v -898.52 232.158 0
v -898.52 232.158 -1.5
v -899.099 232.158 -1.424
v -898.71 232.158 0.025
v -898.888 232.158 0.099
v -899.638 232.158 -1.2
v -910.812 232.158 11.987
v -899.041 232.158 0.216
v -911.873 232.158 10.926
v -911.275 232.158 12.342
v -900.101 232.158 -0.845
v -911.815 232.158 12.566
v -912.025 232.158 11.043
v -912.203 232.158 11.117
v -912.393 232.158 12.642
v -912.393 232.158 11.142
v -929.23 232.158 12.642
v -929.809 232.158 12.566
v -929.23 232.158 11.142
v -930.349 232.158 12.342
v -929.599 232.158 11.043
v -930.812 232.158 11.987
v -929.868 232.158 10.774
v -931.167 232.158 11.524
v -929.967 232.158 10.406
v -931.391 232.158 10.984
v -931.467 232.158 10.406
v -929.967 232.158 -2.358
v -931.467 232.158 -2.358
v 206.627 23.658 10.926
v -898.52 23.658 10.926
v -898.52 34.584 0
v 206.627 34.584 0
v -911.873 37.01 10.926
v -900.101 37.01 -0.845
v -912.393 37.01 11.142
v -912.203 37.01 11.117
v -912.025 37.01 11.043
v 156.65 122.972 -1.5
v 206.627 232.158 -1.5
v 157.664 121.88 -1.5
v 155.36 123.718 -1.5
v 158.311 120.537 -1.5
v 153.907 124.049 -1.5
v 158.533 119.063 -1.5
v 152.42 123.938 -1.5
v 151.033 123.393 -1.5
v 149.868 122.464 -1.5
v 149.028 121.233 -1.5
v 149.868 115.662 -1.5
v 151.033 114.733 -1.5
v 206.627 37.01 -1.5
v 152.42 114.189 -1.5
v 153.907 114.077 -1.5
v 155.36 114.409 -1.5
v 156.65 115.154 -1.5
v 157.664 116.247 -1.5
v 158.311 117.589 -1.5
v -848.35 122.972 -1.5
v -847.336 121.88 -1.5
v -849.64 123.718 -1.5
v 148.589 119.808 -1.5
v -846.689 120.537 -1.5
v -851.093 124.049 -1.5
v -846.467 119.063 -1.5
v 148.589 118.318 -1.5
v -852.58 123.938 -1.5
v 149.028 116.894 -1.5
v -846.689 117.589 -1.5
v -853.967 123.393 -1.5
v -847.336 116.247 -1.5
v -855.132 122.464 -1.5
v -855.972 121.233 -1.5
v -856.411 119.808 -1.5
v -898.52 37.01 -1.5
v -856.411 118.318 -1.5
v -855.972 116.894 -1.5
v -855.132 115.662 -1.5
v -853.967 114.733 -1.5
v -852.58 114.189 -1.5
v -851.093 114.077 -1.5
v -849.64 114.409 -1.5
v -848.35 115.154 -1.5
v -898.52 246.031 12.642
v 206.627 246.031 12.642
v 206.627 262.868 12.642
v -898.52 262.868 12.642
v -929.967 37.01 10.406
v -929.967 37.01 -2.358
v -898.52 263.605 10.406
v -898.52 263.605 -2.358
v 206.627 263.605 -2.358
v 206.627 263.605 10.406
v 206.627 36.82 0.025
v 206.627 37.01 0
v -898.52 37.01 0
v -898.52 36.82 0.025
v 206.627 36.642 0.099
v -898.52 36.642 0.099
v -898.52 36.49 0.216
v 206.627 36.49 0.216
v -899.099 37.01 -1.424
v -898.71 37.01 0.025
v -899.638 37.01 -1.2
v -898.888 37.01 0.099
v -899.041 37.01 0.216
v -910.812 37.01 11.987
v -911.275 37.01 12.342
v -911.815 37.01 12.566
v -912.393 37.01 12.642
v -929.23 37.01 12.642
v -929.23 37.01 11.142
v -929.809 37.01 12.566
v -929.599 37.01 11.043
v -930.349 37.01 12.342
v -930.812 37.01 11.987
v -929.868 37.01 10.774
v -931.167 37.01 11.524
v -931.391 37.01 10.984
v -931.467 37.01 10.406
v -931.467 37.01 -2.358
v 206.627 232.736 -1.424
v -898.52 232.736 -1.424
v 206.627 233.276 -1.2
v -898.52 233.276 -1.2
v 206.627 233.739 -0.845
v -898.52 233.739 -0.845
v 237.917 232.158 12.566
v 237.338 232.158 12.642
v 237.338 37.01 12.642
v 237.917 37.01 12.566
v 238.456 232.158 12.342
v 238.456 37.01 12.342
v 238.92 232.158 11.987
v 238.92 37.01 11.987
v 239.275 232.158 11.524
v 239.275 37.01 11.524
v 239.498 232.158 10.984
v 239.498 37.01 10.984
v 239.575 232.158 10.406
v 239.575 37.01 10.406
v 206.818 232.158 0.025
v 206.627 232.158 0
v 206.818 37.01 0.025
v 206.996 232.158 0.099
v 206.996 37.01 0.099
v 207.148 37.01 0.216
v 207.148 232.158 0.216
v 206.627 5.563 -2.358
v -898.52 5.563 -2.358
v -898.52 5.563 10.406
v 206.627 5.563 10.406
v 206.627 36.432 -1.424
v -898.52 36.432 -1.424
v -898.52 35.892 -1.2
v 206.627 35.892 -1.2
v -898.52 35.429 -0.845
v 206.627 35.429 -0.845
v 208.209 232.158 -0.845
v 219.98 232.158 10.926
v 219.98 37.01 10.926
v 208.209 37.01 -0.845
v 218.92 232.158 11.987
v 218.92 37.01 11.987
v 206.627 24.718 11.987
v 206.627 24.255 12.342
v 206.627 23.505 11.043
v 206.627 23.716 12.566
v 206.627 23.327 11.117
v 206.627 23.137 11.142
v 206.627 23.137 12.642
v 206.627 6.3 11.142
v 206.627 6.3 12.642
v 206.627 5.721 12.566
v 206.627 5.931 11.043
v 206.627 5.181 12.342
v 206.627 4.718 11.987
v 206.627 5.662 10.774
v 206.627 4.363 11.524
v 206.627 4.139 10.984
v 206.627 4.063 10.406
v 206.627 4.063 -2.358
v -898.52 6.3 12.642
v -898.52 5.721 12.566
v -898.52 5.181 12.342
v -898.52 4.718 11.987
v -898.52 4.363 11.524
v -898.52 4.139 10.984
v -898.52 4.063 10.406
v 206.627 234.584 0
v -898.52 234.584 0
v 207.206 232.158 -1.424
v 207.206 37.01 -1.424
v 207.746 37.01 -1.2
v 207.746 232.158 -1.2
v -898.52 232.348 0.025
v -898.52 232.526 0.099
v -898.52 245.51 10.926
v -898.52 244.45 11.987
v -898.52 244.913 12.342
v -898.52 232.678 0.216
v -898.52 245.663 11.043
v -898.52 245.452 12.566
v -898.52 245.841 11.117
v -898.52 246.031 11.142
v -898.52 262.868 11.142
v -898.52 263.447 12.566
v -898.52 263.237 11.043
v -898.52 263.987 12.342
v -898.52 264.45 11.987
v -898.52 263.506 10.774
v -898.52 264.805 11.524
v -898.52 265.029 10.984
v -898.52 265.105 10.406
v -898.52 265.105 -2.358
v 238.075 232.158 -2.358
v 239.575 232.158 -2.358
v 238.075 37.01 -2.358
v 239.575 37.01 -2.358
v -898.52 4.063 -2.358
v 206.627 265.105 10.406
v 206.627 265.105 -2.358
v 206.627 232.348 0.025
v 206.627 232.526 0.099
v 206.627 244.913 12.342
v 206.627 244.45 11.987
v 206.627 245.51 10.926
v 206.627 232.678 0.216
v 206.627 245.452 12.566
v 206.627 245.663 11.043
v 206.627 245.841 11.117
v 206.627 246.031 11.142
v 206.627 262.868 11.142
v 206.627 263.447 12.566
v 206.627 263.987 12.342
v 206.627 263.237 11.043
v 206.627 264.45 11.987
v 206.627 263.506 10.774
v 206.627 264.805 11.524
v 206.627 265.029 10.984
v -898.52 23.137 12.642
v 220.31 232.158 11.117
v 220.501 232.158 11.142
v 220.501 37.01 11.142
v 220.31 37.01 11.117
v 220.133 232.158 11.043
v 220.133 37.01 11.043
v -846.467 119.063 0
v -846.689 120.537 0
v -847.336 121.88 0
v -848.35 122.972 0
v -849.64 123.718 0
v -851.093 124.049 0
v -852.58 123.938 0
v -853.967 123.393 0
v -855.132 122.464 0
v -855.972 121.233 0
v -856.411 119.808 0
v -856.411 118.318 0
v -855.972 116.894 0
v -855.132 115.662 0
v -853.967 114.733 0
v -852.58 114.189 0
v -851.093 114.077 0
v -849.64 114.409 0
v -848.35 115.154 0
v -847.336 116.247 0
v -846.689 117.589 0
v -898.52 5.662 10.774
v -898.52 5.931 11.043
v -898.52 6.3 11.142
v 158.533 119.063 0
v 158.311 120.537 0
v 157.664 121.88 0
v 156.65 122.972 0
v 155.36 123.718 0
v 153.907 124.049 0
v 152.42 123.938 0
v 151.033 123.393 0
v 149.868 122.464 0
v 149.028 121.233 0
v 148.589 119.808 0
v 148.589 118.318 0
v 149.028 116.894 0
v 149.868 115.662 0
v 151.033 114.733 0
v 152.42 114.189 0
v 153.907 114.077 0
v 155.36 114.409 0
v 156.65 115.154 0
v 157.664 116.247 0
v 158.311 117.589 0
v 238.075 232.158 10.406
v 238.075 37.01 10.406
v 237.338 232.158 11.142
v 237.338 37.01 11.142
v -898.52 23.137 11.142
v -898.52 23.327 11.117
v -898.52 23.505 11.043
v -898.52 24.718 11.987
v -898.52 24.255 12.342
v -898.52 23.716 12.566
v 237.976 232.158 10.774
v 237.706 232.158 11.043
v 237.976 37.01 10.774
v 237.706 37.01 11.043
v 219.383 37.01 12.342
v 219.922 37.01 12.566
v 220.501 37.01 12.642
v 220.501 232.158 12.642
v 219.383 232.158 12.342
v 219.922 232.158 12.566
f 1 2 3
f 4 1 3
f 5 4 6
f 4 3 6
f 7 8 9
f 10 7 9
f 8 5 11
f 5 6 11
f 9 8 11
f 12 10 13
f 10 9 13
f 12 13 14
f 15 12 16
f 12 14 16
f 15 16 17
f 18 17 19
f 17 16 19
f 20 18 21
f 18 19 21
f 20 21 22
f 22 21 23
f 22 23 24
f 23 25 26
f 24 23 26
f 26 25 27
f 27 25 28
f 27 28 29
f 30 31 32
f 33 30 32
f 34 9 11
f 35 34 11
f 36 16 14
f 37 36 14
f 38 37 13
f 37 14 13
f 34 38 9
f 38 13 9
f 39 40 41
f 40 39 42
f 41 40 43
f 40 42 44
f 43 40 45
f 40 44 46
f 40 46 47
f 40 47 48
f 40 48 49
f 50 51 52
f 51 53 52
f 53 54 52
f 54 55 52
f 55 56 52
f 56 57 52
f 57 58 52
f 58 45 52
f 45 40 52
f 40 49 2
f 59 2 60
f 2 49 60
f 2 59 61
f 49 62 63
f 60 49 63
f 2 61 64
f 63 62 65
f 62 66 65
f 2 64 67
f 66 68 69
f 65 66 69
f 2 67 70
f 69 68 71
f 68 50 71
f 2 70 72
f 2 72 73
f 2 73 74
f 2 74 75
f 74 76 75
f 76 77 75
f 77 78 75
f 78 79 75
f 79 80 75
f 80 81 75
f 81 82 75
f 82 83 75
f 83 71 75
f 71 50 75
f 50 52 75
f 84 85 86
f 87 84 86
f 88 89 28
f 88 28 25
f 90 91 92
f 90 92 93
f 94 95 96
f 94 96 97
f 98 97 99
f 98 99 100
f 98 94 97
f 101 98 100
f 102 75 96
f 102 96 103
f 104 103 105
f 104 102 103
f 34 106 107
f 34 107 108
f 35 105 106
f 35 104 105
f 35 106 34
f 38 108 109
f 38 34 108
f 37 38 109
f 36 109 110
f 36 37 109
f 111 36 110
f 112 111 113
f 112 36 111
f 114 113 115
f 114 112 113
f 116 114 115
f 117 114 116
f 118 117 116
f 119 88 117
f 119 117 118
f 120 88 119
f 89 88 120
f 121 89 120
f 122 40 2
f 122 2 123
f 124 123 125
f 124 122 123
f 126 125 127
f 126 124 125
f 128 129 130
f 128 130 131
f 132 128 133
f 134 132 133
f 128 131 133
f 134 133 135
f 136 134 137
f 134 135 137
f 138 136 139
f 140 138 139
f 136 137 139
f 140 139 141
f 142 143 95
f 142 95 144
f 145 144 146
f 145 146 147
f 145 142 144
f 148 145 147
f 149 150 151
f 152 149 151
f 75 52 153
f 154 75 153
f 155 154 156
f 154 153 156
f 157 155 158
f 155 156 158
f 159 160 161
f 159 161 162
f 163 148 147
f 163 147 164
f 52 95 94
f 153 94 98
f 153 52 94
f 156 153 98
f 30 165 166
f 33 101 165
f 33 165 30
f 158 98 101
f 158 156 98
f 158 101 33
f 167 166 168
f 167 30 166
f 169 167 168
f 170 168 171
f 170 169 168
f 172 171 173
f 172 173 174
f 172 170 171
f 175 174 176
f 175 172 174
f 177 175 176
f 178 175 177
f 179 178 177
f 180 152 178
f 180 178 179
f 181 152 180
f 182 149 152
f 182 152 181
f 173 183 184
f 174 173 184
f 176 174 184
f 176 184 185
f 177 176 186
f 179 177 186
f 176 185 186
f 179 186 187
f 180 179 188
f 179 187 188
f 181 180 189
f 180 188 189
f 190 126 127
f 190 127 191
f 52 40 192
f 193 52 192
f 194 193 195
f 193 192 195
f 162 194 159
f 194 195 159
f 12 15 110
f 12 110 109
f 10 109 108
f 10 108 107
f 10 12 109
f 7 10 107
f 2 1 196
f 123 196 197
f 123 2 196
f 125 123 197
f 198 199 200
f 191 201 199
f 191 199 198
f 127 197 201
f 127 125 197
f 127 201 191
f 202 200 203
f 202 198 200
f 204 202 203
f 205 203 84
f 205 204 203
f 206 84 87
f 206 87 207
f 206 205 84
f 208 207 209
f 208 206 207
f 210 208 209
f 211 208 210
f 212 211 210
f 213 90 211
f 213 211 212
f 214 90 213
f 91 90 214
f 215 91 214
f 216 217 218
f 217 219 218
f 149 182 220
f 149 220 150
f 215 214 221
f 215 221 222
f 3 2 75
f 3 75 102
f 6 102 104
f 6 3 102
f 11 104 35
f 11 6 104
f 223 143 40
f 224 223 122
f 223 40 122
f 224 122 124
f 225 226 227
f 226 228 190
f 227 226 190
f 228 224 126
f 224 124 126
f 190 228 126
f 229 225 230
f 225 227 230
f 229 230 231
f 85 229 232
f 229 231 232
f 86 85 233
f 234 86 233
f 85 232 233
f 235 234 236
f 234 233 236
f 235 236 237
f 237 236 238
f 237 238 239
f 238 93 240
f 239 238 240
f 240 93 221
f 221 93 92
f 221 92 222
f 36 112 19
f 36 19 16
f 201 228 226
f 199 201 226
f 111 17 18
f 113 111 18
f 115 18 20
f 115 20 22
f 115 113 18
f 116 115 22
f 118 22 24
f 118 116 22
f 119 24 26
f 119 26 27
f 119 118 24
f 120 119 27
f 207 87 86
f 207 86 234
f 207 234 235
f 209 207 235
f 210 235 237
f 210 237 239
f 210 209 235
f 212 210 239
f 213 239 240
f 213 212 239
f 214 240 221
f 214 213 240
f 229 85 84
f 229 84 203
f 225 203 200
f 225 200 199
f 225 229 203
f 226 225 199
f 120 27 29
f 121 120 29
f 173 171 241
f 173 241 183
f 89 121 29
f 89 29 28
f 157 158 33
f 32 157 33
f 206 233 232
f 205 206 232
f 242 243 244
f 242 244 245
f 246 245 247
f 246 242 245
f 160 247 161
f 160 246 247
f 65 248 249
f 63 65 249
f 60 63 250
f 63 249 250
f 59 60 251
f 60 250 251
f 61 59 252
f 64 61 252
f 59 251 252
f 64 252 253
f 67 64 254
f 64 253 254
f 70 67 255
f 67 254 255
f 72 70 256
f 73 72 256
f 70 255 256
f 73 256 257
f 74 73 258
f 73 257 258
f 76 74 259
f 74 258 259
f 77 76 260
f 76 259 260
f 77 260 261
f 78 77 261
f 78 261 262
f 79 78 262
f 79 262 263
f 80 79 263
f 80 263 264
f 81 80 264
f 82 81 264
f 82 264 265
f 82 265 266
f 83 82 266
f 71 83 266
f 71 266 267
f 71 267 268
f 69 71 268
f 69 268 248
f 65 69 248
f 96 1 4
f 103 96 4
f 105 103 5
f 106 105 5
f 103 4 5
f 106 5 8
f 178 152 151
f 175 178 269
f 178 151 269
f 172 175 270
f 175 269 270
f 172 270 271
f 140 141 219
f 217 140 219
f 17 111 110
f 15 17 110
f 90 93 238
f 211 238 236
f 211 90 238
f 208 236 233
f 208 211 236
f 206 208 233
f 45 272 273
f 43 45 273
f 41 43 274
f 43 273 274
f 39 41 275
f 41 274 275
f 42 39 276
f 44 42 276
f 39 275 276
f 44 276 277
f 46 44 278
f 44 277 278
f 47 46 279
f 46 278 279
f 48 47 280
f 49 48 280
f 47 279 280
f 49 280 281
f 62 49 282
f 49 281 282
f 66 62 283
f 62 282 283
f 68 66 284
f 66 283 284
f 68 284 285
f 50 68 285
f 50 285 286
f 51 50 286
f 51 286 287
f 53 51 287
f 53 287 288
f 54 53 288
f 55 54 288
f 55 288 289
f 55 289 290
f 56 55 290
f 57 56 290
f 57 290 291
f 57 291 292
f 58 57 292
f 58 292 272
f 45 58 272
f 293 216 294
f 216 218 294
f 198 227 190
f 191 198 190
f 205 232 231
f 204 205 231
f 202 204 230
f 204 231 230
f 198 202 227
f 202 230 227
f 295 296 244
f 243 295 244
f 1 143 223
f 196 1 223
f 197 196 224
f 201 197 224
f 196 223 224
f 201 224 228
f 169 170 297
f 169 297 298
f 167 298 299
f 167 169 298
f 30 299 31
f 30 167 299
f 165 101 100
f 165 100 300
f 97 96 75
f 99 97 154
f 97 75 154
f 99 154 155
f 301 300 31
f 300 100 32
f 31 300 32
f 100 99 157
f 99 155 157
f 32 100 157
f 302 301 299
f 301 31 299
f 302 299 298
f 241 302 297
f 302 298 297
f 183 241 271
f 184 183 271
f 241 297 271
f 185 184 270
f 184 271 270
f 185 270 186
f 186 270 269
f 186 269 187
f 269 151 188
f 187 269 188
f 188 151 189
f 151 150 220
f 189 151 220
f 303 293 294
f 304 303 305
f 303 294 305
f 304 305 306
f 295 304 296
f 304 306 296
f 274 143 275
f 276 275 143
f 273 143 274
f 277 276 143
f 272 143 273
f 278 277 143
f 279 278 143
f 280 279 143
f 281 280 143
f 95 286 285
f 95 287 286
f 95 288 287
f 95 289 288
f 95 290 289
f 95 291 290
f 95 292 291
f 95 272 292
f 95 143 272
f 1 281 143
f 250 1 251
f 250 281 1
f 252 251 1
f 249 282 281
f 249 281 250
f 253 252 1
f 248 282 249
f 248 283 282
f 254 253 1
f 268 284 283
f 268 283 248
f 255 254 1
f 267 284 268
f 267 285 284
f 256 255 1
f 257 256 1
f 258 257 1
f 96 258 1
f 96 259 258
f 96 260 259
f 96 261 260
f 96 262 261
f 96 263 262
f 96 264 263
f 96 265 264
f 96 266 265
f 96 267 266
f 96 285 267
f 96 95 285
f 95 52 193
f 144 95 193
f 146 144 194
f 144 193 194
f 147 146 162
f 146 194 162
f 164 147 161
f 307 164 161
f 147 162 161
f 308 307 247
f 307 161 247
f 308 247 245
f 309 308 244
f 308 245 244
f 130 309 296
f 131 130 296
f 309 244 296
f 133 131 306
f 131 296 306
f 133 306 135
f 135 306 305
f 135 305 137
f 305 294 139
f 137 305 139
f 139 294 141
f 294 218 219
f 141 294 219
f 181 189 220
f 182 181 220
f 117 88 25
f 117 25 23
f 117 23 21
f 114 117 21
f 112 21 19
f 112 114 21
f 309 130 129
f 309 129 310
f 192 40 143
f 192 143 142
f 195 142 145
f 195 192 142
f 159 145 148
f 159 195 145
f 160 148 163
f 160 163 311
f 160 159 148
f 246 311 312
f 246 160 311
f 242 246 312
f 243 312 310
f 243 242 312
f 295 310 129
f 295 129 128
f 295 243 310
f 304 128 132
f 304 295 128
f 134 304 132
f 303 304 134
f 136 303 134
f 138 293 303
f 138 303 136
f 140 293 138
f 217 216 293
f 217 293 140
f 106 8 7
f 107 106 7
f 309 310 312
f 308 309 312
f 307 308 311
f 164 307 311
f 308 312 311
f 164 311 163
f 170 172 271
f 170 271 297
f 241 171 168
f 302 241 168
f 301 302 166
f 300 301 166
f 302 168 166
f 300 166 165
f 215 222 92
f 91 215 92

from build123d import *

# Parameters (mm, degrees)
SKETCH1_W                      = 555
SKETCH1_H                      = 100
BASE_FLANGE1_DEPTH             = 1.5
EDGE_FLANGE1_START             = 206.627403552
EDGE_FLANGE1_DEPTH             = 2.426430053
EDGE_FLANGE1_START_2           = -345.946166395
EDGE_FLANGE1_2_DEPTH           = 552.573569947
EDGE_FLANGE1_START_3           = 37.010443104
EDGE_FLANGE1_3_DEPTH           = 97.573569947
EDGE_FLANGE1_4_DEPTH           = 555.946166395
EDGE_FLANGE1_START_4           = 34
EDGE_FLANGE1_5_DEPTH           = 102
EDGE_FLANGE2_START             = 37.010443104
EDGE_FLANGE2_DEPTH             = 97.573569947
EDGE_FLANGE2_START_2           = -345.946166395
EDGE_FLANGE2_2_DEPTH           = 552.573569947
EDGE_FLANGE2_3_DEPTH           = 97.573569947
EDGE_FLANGE2_4_DEPTH           = 552.573569947
EDGE_FLANGE3_STRIP_W           = 7.4732
EDGE_FLANGE3_STRIP_H           = 1.5
EDGE_FLANGE3_STRIP_CUT_DEPTH   = 552.573569946
EDGE_FLANGE3_STRIP_2_W         = 7.4732
EDGE_FLANGE3_STRIP_2_H         = 1.5
EDGE_FLANGE3_STRIP_CUT_2_DEPTH = 97.573569946
EDGE_FLANGE3_DEPTH             = 552.573569946
EDGE_FLANGE3_BEND_DEPTH        = 97.573569946
SKETCH24_R                     = 5
CUT_EXTRUDE1_DEPTH             = 10
LPATTERN1_COUNT                = 2
LPATTERN1_PITCH                = 1005


with BuildPart() as part:
    # Base-Flange1: sheet metal written as solids
    # Sketch1 → Base-Flange1 (new body)
    with BuildSketch(Plane.XY):
        with Locations((-68.446166395, 84.584013051)):
            Rectangle(SKETCH1_W, SKETCH1_H)
    extrude(amount=-BASE_FLANGE1_DEPTH)

    # Edge-Flange1: read off the stored shape, not the designer's step
    # Edge-Flange1 outline → Edge-Flange1 (cut)
    with BuildSketch(Plane.YZ.offset(EDGE_FLANGE1_START)):
        with BuildLine():
            Line((21.941877427, 12.642135624), (35.428928077, -0.844915027))
            ThreePointArc((35.428928077, -0.844915027), (36.154533339, -1.329748962), (37.010443104, -1.5))
            Line((37.010443104, -1.5), (37.010443104, 0))
            ThreePointArc((37.010443104, 0), (36.728558488, 0.056070336), (36.489588249, 0.215745145))
            Line((36.489588249, 0.215745145), (23.002537599, 13.702795796))
            Line((23.002537599, 13.702795796), (21.941877427, 12.642135624))
        make_face()
    extrude(amount=EDGE_FLANGE1_DEPTH, mode=Mode.SUBTRACT)

    # Edge-Flange1 2 outline → Edge-Flange1 2 (add)
    with BuildSketch(Plane.YZ.offset(EDGE_FLANGE1_START_2)):
        with BuildLine():
            Line((21.941877427, 12.642135624), (35.428928077, -0.844915027))
            ThreePointArc((35.428928077, -0.844915027), (36.154533339, -1.329748962), (37.010443104, -1.5))
            Line((37.010443104, -1.5), (37.010443104, 0))
            ThreePointArc((37.010443104, 0), (36.728558488, 0.056070336), (36.489588249, 0.215745145))
            Line((36.489588249, 0.215745145), (23.002537599, 13.702795796))
            Line((23.002537599, 13.702795796), (21.941877427, 12.642135624))
        make_face()
    extrude(amount=EDGE_FLANGE1_2_DEPTH)

    # Edge-Flange1 3 outline → Edge-Flange1 3 (add)
    with BuildSketch(Plane(origin=(0, 0, 0), x_dir=(1, 0, 0), z_dir=(0, 1, 0)).offset(EDGE_FLANGE1_START_3)):
        with BuildLine():
            Line((221.695969229, -12.642135624), (209.053833605, 0))
            Line((209.053833605, 0), (206.627403552, 0))
            ThreePointArc((206.627403552, 0), (206.909288168, -0.056070336), (207.148258407, -0.215745145))
            Line((207.148258407, -0.215745145), (220.635309057, -13.702795796))
            Line((220.635309057, -13.702795796), (221.695969229, -12.642135624))
        make_face()
    extrude(amount=EDGE_FLANGE1_3_DEPTH)

    # Edge-Flange1 4 outline → Edge-Flange1 4 (cut)
    with BuildSketch(Plane.YZ.offset(EDGE_FLANGE1_START_2)):
        with BuildLine():
            ThreePointArc((37.010443104, -1.5), (36.154533339, -1.329748962), (35.428928077, -0.844915027))
            Line((35.428928077, -0.844915027), (34.58401305, 0))
            Line((34.58401305, 0), (34.584013051, -1.5))
            Line((34.584013051, -1.5), (37.010443104, -1.5))
        make_face()
    extrude(amount=EDGE_FLANGE1_4_DEPTH, mode=Mode.SUBTRACT)

    # Edge-Flange1 5 outline → Edge-Flange1 5 (cut)
    with BuildSketch(Plane(origin=(0, 0, 0), x_dir=(1, 0, 0), z_dir=(0, 1, 0)).offset(EDGE_FLANGE1_START_4)):
        with BuildLine():
            ThreePointArc((206.627403552, 1.5), (207.483313316, 1.329748962), (208.208918578, 0.844915027))
            Line((208.208918578, 0.844915027), (209.053833605, 0))
            Line((209.053833605, 0), (209.053833605, 1.5))
            Line((209.053833605, 1.5), (206.627403552, 1.5))
        make_face()
    extrude(amount=EDGE_FLANGE1_5_DEPTH, mode=Mode.SUBTRACT)

    # Edge-Flange2: read off the stored shape, not the designer's step
    # Edge-Flange2 outline → Edge-Flange2 (add)
    with BuildSketch(Plane(origin=(0, 0, 0), x_dir=(1, 0, 0), z_dir=(0, 1, 0)).offset(EDGE_FLANGE2_START)):
        with BuildLine():
            Line((221.695969229, -12.642135624), (239.574648885, -12.642135624))
            Line((239.574648885, -12.642135624), (239.574648885, -11.142135624))
            Line((239.574648885, -11.142135624), (220.501078939, -11.142135624))
            ThreePointArc((220.501078939, -11.142135624), (220.219194323, -11.086065287), (219.980224084, -10.926390479))
            Line((219.980224084, -10.926390479), (221.695969229, -12.642135624))
        make_face()
    extrude(amount=EDGE_FLANGE2_DEPTH)

    # Edge-Flange2 2 outline → Edge-Flange2 2 (add)
    with BuildSketch(Plane.YZ.offset(EDGE_FLANGE2_START_2)):
        with BuildLine():
            Line((23.657622572, 10.926390479), (21.941877427, 12.642135624))
            Line((21.941877427, 12.642135624), (4.06319777, 12.642135624))
            Line((4.06319777, 12.642135624), (4.06319777, 11.142135624))
            Line((4.06319777, 11.142135624), (23.136767717, 11.142135624))
            ThreePointArc((23.136767717, 11.142135624), (23.418652333, 11.086065287), (23.657622572, 10.926390479))
        make_face()
    extrude(amount=EDGE_FLANGE2_2_DEPTH)

    # Edge-Flange2 3 outline → Edge-Flange2 3 (cut)
    with BuildSketch(Plane(origin=(0, 0, 0), x_dir=(1, 0, 0), z_dir=(0, 1, 0)).offset(EDGE_FLANGE2_START)):
        with BuildLine():
            Line((220.635309057, -13.702795796), (221.695969229, -12.642135624))
            Line((221.695969229, -12.642135624), (220.501078939, -12.642135624))
            ThreePointArc((220.501078939, -12.642135624), (219.645169174, -12.471884586), (218.919563912, -11.987050651))
            Line((218.919563912, -11.987050651), (220.635309057, -13.702795796))
        make_face()
    extrude(amount=EDGE_FLANGE2_3_DEPTH, mode=Mode.SUBTRACT)

    # Edge-Flange2 4 outline → Edge-Flange2 4 (cut)
    with BuildSketch(Plane.YZ.offset(EDGE_FLANGE2_START_2)):
        with BuildLine():
            Line((21.941877427, 12.642135624), (23.136767717, 12.642135624))
            ThreePointArc((23.136767717, 12.642135624), (23.992677482, 12.471884586), (24.718282744, 11.987050651))
            Line((24.718282744, 11.987050651), (23.002537599, 13.702795796))
            Line((23.002537599, 13.702795796), (21.941877427, 12.642135624))
        make_face()
    extrude(amount=EDGE_FLANGE2_4_DEPTH, mode=Mode.SUBTRACT)

    # Edge-Flange3: sheet metal written as solids
    # Edge-Flange3 strip (on a plane across the edge) → Edge-Flange3 strip cut (cut)
    with BuildSketch(Plane(origin=(206.627403552, 4.06319777, 11.142135624), x_dir=(0, 1, 0), z_dir=(-1, 0, 0))):
        with Locations((-1.5, -0.75)):
            Rectangle(EDGE_FLANGE3_STRIP_W, EDGE_FLANGE3_STRIP_H)
    extrude(amount=EDGE_FLANGE3_STRIP_CUT_DEPTH, mode=Mode.SUBTRACT)

    # Edge-Flange3 strip 2 (on a plane across the edge) → Edge-Flange3 strip cut 2 (cut)
    with BuildSketch(Plane(origin=(239.574648885, 134.584013051, 11.142135624), x_dir=(-1, 0, 0), z_dir=(0, -1, 0))):
        with Locations((-1.5, -0.75)):
            Rectangle(EDGE_FLANGE3_STRIP_2_W, EDGE_FLANGE3_STRIP_2_H)
    extrude(amount=EDGE_FLANGE3_STRIP_CUT_2_DEPTH, mode=Mode.SUBTRACT)

    # Edge-Flange3 section (on a plane across the edge) → Edge-Flange3 (add)
    with BuildSketch(Plane(origin=(206.627403552, 4.06319777, 11.142135624), x_dir=(0, 1, 0), z_dir=(-1, 0, 0))):
        with BuildLine():
            Line((0, 0.7366), (0, 13.5))
            Line((0, 13.5), (1.5, 13.5))
            Line((1.5, 13.5), (1.5, 0.7366))
            ThreePointArc((1.5, 0.7366), (1.715745145, 0.215745145), (2.2366, 0))
            Line((2.2366, 0), (2.2366, -1.5))
            ThreePointArc((2.2366, -1.5), (0.655084973, -0.844915027), (0, 0.7366))
        make_face()
    extrude(amount=EDGE_FLANGE3_DEPTH)

    # Edge-Flange3 section 2 (on a plane across the edge) → Edge-Flange3 bend (add)
    with BuildSketch(Plane(origin=(239.574648885, 134.584013051, 11.142135624), x_dir=(-1, 0, 0), z_dir=(0, -1, 0))):
        with BuildLine():
            Line((0, 0.7366), (0, 13.5))
            Line((0, 13.5), (1.5, 13.5))
            Line((1.5, 13.5), (1.5, 0.7366))
            ThreePointArc((1.5, 0.7366), (1.715745145, 0.215745145), (2.2366, 0))
            Line((2.2366, 0), (2.2366, -1.5))
            ThreePointArc((2.2366, -1.5), (0.655084973, -0.844915027), (0, 0.7366))
        make_face()
    extrude(amount=EDGE_FLANGE3_BEND_DEPTH)

    # Mirror1: part across plane


with BuildPart() as part_1:
    add(part.part)
    add(part.part.mirror(Plane(origin=(-345.946166395, 134.584013051, -1.5), x_dir=(0, 0, 1), z_dir=(-1, 0, 0))))

    # Mirror2: part across plane


with BuildPart() as part_2:
    add(part_1.part)
    add(part_1.part.mirror(Plane(origin=(-345.946166395, 134.584013051, -1.5), x_dir=(0, 0, 1), z_dir=(0, 1, 0))))

    # Sketch24 → Cut-Extrude1 (cut)
    with BuildSketch(Plane.XY):
        with Locations((-851.466981675, 119.06319777)):
            Circle(SKETCH24_R)
    cut_extrude1 = extrude(amount=-CUT_EXTRUDE1_DEPTH, mode=Mode.SUBTRACT)

    # LPattern1: Cut-Extrude1 ×2
    with Locations(*[(i * LPATTERN1_PITCH, 0, 0) for i in range(1, LPATTERN1_COUNT)]):
        add(cut_extrude1, mode=Mode.SUBTRACT)


solid = part_2.part
